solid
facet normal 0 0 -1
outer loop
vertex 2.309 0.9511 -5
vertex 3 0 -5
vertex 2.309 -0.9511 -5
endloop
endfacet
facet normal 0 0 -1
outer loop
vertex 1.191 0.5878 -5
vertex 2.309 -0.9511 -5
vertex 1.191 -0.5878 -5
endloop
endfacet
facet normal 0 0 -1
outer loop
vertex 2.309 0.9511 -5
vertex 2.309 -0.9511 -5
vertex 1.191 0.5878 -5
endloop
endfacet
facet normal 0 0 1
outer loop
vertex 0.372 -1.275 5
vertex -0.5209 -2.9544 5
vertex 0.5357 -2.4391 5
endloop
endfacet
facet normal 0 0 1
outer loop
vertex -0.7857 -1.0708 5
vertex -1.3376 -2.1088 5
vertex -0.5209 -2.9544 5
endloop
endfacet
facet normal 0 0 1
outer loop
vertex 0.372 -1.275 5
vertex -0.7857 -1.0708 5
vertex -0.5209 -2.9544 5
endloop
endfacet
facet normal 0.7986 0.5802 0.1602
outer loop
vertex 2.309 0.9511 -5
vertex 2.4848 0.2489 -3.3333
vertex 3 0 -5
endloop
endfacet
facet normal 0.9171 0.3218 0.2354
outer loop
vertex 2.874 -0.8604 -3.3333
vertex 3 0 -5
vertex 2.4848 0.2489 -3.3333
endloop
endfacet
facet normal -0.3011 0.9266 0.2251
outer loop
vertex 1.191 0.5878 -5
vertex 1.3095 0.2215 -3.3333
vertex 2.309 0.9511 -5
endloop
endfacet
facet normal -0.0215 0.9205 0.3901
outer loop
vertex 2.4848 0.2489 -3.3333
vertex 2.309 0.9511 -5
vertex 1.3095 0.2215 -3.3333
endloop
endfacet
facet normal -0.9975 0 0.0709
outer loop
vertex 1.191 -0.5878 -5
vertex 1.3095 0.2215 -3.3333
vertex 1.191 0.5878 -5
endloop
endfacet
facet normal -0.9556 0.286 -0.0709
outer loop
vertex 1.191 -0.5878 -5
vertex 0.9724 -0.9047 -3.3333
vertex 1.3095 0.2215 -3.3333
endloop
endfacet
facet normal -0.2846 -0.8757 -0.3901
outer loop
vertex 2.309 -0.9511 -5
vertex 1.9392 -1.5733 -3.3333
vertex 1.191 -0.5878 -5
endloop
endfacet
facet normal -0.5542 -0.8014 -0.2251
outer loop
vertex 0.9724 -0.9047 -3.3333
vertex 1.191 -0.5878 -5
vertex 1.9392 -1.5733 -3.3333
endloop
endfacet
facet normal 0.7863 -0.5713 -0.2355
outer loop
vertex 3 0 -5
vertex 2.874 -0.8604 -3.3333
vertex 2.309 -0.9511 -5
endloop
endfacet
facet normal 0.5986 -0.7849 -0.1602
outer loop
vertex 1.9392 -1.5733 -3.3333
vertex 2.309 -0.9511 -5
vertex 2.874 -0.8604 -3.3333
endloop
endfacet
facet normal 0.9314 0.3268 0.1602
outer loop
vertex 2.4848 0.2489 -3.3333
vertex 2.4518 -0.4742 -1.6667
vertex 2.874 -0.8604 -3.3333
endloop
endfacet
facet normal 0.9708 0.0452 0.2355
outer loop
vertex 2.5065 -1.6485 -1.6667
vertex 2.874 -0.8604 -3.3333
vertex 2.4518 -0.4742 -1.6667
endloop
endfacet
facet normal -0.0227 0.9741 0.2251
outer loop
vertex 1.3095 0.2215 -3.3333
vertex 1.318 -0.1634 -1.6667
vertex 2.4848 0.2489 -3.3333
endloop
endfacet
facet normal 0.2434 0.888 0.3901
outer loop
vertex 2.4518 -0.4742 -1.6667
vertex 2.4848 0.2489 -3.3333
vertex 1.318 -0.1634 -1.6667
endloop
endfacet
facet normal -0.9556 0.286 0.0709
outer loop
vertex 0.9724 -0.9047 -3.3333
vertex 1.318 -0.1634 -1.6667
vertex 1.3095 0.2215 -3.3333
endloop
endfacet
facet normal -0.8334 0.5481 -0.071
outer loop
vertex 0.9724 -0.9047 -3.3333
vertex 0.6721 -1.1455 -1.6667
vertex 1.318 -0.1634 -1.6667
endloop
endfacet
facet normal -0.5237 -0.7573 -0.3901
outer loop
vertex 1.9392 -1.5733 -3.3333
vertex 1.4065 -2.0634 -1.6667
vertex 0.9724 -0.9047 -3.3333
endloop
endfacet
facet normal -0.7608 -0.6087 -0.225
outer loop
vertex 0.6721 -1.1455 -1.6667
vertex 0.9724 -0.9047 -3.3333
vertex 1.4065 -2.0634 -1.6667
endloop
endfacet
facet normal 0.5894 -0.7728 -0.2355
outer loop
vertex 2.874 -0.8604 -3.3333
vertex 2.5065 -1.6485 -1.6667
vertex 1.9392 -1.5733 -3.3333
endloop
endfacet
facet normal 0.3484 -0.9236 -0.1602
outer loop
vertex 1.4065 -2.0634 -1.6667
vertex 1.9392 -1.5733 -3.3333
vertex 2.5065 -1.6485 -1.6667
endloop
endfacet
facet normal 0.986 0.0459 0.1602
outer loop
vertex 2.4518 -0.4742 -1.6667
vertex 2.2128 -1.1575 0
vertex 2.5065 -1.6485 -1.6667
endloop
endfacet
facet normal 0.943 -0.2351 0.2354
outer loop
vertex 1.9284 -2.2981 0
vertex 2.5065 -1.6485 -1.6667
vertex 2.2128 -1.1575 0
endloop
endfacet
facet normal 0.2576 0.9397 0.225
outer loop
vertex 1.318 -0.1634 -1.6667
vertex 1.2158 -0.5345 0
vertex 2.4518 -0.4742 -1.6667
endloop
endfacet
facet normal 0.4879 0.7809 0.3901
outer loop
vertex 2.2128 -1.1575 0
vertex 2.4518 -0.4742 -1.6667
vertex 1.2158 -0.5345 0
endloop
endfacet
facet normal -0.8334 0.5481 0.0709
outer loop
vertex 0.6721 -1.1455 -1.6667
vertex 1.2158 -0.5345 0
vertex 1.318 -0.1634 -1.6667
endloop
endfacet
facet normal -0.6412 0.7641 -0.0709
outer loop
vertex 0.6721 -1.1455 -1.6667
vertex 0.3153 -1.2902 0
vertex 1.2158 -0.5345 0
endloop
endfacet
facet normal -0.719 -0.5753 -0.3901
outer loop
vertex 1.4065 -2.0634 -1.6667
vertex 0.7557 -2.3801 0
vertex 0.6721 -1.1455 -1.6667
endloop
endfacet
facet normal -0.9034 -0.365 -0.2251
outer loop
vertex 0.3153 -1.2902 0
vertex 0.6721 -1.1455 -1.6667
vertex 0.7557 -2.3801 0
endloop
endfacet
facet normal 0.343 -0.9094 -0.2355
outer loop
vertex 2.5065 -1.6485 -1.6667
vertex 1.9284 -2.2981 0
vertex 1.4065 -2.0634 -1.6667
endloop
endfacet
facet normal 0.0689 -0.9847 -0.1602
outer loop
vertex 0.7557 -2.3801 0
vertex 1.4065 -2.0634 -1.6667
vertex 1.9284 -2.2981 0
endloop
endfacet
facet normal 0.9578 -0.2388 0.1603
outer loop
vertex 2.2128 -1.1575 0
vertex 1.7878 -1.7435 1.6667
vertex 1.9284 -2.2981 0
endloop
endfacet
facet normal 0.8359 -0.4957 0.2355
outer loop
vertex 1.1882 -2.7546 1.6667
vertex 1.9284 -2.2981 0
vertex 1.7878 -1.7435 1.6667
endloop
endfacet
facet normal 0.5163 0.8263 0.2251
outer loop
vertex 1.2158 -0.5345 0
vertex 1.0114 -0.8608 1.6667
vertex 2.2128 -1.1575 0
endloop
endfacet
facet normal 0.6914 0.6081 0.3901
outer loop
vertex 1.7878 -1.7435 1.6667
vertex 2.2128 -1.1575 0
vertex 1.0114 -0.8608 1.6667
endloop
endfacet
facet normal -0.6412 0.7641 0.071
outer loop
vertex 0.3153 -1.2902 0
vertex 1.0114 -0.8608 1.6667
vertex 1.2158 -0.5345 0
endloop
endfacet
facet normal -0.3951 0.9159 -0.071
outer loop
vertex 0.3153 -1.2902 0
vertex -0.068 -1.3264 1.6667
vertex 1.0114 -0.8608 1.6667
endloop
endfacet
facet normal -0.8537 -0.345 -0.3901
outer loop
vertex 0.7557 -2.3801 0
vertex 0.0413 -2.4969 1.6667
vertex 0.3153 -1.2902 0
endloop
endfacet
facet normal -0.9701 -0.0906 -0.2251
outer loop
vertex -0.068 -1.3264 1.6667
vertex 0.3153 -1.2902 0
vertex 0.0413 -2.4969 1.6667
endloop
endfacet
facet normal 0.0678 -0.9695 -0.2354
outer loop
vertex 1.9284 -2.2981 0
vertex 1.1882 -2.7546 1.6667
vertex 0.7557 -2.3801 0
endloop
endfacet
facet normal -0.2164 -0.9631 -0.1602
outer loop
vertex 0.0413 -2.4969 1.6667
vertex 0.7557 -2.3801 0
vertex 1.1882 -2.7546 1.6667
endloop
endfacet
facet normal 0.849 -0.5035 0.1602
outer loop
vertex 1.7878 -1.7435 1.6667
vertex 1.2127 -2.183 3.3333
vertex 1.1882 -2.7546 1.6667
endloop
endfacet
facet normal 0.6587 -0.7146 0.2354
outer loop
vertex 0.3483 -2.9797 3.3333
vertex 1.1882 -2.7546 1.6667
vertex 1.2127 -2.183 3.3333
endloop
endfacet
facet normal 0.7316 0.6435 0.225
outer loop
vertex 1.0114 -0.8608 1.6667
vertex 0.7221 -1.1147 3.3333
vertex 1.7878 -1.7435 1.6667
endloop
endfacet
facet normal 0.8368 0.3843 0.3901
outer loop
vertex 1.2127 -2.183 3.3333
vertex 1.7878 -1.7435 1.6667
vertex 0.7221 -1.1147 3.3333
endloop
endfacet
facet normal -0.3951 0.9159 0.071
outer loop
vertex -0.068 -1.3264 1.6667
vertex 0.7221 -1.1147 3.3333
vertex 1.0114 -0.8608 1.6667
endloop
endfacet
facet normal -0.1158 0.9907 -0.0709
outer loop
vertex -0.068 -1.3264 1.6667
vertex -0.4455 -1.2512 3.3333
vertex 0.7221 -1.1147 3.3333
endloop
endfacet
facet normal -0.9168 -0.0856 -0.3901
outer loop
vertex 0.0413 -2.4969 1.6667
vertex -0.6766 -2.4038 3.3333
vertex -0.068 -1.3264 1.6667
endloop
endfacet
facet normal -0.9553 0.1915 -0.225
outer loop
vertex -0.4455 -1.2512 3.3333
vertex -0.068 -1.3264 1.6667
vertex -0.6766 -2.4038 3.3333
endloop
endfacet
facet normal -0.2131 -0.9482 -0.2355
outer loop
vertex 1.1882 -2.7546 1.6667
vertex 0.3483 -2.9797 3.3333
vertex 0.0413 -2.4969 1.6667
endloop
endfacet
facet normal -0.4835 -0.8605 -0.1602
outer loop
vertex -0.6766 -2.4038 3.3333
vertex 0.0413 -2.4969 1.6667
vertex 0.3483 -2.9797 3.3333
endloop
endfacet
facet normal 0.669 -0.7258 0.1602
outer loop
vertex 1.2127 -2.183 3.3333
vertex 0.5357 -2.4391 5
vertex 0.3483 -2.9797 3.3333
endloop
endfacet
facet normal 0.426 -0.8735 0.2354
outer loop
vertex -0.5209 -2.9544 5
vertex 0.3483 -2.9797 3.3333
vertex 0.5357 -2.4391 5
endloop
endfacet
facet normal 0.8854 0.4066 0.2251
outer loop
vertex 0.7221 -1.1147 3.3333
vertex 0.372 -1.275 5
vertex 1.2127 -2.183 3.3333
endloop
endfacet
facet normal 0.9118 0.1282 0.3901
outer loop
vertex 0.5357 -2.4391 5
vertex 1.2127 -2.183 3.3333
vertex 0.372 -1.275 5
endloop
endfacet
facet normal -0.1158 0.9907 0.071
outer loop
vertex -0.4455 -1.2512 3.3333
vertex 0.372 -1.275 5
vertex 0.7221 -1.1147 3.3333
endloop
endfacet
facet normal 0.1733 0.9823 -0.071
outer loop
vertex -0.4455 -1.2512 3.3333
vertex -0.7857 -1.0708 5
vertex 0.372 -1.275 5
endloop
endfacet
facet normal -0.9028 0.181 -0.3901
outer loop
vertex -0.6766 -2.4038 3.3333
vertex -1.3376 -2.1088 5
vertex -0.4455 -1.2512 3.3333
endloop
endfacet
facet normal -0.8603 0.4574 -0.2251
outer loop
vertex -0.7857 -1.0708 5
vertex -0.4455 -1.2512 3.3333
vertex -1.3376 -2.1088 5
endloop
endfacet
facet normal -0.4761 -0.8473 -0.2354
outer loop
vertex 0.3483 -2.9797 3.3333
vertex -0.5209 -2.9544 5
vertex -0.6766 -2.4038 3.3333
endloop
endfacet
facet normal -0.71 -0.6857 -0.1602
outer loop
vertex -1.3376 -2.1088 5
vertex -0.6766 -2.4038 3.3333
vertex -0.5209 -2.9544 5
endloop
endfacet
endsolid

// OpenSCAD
linear_extrude(height = 10, center = true, convexity = 10, twist = 100)
translate([2, 0, 0])
circle(r = 1);
